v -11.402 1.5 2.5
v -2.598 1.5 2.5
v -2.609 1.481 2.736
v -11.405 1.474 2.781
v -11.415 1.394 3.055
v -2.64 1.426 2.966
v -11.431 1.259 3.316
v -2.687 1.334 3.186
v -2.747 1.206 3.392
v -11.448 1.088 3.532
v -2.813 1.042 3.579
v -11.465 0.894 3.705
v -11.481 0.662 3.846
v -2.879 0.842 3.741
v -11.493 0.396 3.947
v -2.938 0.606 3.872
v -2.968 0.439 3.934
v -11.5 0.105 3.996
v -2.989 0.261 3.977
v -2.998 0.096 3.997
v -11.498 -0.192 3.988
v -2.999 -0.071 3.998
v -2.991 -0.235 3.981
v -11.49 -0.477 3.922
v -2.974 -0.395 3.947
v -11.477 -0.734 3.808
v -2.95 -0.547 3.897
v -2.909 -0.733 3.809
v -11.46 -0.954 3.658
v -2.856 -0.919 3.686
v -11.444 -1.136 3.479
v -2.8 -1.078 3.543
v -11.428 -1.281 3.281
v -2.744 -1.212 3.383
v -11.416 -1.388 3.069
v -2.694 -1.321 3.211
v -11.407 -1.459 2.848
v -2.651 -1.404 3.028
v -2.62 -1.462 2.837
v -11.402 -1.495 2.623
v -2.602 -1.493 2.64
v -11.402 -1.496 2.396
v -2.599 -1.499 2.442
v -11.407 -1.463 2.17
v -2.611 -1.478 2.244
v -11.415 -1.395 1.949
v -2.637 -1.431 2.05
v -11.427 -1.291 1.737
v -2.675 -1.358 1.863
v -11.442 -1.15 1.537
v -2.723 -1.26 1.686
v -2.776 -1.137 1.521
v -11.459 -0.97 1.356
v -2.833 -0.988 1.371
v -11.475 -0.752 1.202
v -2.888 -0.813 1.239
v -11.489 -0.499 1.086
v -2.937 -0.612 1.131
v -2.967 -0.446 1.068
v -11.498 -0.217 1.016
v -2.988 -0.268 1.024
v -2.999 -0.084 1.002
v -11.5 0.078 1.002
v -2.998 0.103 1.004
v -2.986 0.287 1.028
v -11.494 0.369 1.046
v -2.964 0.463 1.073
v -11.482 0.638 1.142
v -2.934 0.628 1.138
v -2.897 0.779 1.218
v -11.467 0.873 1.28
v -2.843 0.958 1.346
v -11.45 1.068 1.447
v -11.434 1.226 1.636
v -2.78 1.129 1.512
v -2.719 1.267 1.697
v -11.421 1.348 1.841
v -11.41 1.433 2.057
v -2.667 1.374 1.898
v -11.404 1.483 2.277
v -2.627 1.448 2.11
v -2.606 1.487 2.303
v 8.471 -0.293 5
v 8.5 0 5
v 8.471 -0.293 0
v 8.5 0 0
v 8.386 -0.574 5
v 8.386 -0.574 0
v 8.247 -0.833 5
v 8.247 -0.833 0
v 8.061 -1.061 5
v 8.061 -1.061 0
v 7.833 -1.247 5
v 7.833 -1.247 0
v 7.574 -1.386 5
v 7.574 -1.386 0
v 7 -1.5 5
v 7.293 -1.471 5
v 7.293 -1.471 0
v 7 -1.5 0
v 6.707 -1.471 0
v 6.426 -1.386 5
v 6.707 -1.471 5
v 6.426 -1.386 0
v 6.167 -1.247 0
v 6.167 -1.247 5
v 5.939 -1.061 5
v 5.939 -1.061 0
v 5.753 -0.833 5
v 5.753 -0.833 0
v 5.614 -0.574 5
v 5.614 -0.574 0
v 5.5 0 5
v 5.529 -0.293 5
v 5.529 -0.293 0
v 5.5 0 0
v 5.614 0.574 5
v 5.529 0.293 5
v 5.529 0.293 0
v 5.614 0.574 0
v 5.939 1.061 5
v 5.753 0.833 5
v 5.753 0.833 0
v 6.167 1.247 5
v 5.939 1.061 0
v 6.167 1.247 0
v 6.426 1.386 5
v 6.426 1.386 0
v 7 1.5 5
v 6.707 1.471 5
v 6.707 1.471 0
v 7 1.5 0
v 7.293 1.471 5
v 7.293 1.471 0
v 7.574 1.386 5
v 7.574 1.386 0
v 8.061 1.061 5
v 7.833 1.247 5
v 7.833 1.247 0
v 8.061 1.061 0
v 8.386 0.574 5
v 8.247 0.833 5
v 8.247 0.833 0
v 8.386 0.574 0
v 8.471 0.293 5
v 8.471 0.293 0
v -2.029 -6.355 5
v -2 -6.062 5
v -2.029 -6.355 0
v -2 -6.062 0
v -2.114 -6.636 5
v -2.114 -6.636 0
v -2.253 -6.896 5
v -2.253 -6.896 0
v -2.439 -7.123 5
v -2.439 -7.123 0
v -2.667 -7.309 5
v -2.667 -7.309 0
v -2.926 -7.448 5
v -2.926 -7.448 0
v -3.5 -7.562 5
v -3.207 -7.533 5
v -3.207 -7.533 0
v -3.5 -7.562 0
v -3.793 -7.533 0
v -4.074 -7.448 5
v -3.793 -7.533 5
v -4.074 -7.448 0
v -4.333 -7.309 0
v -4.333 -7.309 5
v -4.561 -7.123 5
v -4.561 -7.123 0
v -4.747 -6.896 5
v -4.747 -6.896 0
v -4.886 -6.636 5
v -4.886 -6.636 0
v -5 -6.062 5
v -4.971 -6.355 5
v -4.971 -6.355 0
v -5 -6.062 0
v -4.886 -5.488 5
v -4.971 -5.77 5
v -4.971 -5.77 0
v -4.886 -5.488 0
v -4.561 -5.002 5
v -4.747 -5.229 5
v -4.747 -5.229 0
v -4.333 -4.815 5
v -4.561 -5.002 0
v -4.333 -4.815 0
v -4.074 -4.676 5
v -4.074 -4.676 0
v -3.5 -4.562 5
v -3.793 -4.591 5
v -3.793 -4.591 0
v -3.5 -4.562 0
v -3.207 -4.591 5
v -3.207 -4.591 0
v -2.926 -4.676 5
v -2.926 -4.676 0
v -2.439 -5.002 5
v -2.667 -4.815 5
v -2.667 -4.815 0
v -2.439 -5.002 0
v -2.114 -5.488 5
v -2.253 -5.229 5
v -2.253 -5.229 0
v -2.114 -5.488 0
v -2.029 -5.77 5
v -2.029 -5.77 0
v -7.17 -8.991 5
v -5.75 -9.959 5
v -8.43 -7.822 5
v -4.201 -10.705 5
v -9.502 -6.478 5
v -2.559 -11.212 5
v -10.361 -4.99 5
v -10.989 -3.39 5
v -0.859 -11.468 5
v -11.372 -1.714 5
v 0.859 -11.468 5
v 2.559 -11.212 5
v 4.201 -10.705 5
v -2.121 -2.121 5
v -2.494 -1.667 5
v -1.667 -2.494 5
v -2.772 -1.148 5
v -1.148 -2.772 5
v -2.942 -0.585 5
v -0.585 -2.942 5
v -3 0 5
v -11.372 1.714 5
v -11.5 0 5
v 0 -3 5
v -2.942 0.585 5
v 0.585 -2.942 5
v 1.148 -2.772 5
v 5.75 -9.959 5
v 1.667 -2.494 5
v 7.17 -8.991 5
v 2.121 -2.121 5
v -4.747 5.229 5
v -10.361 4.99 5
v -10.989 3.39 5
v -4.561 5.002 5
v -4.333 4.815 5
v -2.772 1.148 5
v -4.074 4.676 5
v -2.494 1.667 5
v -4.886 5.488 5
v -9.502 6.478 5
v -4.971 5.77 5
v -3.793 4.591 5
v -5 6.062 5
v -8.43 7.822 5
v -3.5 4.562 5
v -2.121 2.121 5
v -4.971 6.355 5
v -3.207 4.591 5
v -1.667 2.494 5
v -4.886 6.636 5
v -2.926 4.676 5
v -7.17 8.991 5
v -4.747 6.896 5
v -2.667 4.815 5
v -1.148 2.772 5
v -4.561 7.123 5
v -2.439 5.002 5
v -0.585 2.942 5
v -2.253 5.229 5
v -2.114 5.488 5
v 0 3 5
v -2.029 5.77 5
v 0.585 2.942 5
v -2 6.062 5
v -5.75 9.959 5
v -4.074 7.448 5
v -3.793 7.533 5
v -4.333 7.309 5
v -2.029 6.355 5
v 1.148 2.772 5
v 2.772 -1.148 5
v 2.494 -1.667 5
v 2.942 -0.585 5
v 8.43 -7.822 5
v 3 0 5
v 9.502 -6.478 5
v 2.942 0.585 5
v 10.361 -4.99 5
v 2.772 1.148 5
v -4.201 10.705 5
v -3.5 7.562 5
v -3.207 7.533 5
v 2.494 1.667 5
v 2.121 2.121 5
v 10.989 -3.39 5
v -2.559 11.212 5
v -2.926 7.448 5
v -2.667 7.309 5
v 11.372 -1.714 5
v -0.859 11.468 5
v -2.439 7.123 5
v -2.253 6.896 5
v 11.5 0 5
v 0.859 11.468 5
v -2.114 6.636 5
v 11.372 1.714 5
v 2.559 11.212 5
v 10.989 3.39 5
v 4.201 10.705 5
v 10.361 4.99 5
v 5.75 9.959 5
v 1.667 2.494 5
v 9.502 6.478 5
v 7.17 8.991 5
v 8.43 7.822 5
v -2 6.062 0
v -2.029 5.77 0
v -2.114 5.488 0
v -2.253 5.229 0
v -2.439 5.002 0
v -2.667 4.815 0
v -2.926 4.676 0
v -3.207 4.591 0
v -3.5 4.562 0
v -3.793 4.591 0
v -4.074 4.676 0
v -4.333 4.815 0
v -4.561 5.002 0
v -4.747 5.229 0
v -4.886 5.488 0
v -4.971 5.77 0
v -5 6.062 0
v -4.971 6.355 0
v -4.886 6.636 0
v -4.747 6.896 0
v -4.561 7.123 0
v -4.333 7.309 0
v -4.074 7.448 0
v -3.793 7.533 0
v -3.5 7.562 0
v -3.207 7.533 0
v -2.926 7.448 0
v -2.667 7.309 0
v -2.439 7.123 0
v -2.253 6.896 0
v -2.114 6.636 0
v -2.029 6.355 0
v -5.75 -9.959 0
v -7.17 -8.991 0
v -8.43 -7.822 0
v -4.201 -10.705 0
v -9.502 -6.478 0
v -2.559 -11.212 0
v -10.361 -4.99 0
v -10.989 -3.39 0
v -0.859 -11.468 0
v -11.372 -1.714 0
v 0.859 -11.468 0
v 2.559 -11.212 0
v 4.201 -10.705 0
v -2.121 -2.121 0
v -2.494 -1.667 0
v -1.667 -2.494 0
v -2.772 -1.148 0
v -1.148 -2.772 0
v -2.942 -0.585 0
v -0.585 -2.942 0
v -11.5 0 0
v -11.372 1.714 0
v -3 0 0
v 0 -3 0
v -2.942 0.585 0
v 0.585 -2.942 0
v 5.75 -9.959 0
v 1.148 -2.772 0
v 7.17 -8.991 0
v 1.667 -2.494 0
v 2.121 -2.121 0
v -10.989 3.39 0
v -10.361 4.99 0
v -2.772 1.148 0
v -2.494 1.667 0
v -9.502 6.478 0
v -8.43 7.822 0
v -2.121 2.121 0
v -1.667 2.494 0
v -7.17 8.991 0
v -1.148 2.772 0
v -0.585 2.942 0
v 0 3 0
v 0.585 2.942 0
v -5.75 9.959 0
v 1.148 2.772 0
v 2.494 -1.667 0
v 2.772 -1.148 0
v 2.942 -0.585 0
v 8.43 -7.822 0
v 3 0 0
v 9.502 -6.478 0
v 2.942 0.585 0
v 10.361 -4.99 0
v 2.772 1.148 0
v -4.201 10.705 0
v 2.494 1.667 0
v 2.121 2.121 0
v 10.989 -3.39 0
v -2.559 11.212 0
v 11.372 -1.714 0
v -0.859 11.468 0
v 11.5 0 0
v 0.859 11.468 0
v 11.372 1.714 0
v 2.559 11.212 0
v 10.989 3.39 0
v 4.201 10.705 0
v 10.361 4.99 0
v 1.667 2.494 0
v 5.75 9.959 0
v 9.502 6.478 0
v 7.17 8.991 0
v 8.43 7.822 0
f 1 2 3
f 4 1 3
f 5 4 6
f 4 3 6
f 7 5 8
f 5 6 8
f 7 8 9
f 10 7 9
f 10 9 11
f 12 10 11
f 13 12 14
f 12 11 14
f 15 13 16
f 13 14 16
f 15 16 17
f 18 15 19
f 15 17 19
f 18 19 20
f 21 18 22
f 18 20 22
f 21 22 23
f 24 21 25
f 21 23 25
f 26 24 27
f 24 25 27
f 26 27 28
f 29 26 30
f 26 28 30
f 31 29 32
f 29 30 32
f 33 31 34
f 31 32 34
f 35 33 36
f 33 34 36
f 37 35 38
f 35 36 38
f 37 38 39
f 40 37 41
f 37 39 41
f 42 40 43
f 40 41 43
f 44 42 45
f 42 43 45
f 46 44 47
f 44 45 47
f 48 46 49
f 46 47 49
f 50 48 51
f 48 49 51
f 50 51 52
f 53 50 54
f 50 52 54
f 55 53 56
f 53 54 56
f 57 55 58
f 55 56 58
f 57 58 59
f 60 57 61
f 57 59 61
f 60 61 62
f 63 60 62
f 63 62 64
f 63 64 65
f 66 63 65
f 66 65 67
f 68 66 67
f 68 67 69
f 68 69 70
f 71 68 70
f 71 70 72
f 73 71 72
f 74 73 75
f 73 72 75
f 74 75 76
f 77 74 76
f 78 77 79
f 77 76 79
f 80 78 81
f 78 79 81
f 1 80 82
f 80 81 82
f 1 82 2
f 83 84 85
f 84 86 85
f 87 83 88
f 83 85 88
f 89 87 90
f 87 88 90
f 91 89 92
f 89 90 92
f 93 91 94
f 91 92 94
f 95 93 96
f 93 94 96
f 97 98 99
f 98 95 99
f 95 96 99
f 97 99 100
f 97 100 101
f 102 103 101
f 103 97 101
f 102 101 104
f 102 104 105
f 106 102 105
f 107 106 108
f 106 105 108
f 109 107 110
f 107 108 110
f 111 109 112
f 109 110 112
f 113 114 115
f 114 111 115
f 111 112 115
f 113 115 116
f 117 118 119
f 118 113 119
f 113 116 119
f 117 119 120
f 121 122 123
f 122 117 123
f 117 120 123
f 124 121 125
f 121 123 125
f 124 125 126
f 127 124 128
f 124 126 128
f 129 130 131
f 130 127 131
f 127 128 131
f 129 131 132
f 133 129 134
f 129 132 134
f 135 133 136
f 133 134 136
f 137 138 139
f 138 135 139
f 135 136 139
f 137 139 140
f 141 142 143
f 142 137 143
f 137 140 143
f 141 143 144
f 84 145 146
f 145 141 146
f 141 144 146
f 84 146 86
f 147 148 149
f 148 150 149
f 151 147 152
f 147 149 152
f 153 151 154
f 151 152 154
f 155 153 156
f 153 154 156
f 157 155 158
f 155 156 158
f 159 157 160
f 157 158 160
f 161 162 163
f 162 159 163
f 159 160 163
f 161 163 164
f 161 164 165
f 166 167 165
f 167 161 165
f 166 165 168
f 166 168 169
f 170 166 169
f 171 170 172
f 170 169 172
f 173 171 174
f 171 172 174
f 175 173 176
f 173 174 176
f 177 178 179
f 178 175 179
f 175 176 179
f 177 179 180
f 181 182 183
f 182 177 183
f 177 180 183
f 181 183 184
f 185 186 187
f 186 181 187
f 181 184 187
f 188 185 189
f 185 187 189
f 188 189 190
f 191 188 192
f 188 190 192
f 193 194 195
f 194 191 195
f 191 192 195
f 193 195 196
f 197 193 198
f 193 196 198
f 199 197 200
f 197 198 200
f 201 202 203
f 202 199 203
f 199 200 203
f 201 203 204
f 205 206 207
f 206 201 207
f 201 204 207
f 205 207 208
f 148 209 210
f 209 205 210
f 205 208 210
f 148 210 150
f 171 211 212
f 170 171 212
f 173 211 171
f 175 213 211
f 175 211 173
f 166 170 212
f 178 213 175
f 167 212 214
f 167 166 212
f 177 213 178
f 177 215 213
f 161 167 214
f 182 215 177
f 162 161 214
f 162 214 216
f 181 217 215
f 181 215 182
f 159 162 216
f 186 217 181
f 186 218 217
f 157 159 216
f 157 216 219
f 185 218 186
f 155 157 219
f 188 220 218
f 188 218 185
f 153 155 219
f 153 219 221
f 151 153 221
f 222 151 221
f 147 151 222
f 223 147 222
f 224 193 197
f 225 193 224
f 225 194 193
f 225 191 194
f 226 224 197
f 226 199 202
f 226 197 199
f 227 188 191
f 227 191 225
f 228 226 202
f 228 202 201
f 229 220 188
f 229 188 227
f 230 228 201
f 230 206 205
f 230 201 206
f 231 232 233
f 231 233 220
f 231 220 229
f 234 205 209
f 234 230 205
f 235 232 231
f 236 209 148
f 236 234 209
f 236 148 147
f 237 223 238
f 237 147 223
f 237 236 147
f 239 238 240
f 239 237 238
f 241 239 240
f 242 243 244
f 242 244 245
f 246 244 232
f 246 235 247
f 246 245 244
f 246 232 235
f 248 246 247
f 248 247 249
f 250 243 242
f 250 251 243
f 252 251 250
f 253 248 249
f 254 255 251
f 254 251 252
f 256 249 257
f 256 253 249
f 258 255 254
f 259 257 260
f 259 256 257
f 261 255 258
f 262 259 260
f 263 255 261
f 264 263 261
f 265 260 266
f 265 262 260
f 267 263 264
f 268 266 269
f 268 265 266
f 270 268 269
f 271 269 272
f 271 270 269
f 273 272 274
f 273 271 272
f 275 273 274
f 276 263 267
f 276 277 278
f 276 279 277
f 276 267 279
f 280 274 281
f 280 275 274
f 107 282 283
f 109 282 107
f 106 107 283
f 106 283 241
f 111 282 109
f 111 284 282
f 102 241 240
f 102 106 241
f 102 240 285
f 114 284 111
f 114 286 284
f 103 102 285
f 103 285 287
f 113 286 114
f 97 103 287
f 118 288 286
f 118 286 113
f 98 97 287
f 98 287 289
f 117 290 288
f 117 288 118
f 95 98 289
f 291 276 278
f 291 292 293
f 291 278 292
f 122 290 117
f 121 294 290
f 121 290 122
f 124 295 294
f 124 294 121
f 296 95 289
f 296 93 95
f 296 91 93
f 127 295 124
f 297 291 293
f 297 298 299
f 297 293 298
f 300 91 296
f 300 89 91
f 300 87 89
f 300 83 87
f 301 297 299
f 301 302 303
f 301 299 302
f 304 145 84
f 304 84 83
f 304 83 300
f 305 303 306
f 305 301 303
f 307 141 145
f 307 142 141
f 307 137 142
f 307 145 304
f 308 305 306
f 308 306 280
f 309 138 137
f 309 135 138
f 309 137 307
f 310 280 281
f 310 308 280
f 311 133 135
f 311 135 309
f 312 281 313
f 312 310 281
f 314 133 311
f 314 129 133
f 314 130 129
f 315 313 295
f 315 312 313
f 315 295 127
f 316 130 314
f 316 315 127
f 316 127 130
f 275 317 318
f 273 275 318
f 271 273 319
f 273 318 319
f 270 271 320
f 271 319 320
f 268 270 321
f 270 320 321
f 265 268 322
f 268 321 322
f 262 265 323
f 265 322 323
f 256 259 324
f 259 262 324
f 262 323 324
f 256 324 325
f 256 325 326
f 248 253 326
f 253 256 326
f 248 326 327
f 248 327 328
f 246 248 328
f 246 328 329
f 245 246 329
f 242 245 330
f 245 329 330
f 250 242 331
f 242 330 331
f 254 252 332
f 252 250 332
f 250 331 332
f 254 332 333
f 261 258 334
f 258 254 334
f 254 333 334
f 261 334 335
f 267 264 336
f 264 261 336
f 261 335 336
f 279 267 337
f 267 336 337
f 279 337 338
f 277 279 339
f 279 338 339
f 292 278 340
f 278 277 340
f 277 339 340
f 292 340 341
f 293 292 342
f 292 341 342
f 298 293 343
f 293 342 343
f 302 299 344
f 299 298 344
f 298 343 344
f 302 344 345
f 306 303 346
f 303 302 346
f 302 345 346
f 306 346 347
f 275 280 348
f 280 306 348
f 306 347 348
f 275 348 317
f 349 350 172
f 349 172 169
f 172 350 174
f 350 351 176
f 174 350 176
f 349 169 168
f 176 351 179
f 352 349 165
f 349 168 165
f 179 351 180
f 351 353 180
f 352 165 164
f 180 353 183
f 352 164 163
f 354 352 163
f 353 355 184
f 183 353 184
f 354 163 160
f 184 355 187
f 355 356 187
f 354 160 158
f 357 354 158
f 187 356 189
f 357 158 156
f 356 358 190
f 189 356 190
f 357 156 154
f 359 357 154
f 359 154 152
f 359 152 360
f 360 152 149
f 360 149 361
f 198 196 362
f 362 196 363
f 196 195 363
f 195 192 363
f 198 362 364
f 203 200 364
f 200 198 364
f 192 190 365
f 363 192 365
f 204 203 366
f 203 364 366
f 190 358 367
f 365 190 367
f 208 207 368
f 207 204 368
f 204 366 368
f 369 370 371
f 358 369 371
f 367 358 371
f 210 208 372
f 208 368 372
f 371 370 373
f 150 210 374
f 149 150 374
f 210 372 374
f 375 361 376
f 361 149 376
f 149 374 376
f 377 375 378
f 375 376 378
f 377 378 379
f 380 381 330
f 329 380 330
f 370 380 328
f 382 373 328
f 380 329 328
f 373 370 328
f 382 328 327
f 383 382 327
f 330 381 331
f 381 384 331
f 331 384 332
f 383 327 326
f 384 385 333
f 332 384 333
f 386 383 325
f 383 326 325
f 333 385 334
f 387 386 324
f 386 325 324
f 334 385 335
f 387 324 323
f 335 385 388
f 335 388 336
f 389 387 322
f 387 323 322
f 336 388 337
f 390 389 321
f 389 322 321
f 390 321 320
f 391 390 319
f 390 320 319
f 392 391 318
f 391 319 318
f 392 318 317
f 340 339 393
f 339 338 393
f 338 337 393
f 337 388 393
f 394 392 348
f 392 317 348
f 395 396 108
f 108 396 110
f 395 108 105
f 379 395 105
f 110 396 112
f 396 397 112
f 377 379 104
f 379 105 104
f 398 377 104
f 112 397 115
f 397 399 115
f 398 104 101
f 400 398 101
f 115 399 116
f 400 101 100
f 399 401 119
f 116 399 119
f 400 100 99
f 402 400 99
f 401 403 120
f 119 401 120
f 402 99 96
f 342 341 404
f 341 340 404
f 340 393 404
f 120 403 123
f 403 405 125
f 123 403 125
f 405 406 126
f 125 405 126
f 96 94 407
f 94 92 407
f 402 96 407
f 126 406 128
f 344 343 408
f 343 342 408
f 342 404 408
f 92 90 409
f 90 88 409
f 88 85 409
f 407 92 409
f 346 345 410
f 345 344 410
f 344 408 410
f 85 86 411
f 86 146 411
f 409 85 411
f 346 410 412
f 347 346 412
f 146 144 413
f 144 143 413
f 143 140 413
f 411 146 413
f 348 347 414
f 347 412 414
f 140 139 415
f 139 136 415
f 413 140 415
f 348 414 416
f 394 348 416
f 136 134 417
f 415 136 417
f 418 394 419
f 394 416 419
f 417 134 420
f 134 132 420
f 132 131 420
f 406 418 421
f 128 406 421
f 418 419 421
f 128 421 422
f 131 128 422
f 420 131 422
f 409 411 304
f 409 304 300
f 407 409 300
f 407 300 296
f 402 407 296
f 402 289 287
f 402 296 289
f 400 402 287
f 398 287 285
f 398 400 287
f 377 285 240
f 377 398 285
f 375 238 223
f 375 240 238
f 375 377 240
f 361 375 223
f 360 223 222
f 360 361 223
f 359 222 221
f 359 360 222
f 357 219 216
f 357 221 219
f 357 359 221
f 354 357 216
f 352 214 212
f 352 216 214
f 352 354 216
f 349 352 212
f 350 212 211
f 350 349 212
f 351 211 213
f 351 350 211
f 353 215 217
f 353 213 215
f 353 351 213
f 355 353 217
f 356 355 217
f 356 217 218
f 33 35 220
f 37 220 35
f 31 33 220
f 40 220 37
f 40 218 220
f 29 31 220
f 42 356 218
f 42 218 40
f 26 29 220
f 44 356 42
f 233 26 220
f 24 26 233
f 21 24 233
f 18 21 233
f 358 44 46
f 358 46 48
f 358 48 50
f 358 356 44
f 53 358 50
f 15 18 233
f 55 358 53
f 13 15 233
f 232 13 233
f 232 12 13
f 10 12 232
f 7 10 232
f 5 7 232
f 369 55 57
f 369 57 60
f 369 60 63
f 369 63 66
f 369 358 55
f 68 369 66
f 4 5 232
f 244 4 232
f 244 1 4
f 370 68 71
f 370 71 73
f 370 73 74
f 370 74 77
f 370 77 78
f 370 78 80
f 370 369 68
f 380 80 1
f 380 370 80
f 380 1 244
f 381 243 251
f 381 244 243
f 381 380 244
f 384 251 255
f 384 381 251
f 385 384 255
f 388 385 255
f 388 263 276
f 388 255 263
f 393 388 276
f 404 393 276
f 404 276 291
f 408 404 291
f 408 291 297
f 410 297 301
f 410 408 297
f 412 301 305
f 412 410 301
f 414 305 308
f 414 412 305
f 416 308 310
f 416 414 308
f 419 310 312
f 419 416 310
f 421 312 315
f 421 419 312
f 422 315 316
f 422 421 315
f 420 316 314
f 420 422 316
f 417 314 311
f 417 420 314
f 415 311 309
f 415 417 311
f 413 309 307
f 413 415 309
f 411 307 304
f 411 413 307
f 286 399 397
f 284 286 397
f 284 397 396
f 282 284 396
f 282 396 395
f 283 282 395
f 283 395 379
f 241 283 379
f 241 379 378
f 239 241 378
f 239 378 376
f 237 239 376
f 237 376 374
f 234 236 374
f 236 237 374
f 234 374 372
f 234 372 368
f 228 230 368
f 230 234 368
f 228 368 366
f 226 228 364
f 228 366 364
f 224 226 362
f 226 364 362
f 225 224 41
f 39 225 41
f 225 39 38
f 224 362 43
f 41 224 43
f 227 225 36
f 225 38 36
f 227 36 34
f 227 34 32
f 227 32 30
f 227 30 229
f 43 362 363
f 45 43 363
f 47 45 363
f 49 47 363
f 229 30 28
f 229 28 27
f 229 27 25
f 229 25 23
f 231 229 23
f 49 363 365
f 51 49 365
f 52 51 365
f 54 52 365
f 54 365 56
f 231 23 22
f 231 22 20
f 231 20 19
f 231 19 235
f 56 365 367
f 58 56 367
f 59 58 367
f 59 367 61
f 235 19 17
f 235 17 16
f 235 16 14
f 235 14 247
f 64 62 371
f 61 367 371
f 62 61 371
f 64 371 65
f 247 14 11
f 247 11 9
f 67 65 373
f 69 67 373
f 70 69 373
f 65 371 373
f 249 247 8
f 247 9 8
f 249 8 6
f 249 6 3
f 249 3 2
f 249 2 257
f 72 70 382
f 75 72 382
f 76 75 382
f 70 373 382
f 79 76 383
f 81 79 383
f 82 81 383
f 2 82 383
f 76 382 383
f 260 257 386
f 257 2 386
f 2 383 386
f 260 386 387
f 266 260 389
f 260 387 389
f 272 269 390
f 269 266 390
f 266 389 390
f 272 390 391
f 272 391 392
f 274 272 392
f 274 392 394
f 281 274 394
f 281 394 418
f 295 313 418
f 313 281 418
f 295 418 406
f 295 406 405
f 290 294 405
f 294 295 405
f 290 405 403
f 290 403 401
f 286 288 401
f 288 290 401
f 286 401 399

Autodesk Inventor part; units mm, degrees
ref_plane "YZ Plane" through (0, 0, 0) normal (1, 0, 0) x (0, 1, 0)
ref_plane "XZ Plane" through (0, 0, 0) normal (0, 1, 0) x (-1, 0, 0)
ref_plane "XY Plane" through (0, 0, 0) normal (0, 0, 1) x (1, 0, 0)
sketch "Sketch3" plane through (0, 0, 0) normal (0, 0, 1) x (1, 0, 0)
  circle A0 centre (0, 0) radius 11.5
  circle A1 centre (0, 0) radius 3
  circle A2 centre (7, 0) radius 1.5
  circle A3 centre (3.5, 6.0622) radius 1.5
  circle A4 centre (-3.5, 6.0622) radius 1.5
  circle A5 centre (-7, 0) radius 1.5
  circle A6 centre (-3.5, -6.0622) radius 1.5
  circle A7 centre (3.5, -6.0622) radius 1.5
  dimension "d0" = 23
  dimension "d1" = 6
  dimension "d4" = 3
  dimension "d5" = 7
  dimension "d12" = 360
extrude "Extrusion1" add sketch "Sketch3" along normal blind 5 contours A0 | A3 | A5 | A7
sketch "Sketch4" plane through (0, 0, 0) normal (1, 0, 0) x (0, 1, 0)
  line L0 (-11.5, 0) -> (11.5, 0) projected
  line L1 (-3, 5) -> (3, 5) projected
  line L2 (3, 0) -> (-3, 0) projected
  circle A0 centre (0, 2.5) radius 1.5
  line L3 (3, 0) -> (3, 5) projected
  point P0 (0, 0)
  point P1 (0, 0)
  point P2 (3, 2.5)
  dimension "d14" = 3
extrude "Extrusion2" cut sketch "Sketch4" against normal through all
thread "Thread1" size "M3x0.5" class "6H" standard "ANSI Metric M Profile" full length
thread "Thread2" size "M3x0.5" class "6H" standard "ANSI Metric M Profile" full length
thread "Thread3" size "M3x0.5" class "6H" standard "ANSI Metric M Profile" full length
thread "Thread4" size "M3x0.5" class "6H" standard "ANSI Metric M Profile" full length
equation "\"d15\" = d14"
properties part number "6mm Mounting Hub, thin" material "Aluminum 6061"
